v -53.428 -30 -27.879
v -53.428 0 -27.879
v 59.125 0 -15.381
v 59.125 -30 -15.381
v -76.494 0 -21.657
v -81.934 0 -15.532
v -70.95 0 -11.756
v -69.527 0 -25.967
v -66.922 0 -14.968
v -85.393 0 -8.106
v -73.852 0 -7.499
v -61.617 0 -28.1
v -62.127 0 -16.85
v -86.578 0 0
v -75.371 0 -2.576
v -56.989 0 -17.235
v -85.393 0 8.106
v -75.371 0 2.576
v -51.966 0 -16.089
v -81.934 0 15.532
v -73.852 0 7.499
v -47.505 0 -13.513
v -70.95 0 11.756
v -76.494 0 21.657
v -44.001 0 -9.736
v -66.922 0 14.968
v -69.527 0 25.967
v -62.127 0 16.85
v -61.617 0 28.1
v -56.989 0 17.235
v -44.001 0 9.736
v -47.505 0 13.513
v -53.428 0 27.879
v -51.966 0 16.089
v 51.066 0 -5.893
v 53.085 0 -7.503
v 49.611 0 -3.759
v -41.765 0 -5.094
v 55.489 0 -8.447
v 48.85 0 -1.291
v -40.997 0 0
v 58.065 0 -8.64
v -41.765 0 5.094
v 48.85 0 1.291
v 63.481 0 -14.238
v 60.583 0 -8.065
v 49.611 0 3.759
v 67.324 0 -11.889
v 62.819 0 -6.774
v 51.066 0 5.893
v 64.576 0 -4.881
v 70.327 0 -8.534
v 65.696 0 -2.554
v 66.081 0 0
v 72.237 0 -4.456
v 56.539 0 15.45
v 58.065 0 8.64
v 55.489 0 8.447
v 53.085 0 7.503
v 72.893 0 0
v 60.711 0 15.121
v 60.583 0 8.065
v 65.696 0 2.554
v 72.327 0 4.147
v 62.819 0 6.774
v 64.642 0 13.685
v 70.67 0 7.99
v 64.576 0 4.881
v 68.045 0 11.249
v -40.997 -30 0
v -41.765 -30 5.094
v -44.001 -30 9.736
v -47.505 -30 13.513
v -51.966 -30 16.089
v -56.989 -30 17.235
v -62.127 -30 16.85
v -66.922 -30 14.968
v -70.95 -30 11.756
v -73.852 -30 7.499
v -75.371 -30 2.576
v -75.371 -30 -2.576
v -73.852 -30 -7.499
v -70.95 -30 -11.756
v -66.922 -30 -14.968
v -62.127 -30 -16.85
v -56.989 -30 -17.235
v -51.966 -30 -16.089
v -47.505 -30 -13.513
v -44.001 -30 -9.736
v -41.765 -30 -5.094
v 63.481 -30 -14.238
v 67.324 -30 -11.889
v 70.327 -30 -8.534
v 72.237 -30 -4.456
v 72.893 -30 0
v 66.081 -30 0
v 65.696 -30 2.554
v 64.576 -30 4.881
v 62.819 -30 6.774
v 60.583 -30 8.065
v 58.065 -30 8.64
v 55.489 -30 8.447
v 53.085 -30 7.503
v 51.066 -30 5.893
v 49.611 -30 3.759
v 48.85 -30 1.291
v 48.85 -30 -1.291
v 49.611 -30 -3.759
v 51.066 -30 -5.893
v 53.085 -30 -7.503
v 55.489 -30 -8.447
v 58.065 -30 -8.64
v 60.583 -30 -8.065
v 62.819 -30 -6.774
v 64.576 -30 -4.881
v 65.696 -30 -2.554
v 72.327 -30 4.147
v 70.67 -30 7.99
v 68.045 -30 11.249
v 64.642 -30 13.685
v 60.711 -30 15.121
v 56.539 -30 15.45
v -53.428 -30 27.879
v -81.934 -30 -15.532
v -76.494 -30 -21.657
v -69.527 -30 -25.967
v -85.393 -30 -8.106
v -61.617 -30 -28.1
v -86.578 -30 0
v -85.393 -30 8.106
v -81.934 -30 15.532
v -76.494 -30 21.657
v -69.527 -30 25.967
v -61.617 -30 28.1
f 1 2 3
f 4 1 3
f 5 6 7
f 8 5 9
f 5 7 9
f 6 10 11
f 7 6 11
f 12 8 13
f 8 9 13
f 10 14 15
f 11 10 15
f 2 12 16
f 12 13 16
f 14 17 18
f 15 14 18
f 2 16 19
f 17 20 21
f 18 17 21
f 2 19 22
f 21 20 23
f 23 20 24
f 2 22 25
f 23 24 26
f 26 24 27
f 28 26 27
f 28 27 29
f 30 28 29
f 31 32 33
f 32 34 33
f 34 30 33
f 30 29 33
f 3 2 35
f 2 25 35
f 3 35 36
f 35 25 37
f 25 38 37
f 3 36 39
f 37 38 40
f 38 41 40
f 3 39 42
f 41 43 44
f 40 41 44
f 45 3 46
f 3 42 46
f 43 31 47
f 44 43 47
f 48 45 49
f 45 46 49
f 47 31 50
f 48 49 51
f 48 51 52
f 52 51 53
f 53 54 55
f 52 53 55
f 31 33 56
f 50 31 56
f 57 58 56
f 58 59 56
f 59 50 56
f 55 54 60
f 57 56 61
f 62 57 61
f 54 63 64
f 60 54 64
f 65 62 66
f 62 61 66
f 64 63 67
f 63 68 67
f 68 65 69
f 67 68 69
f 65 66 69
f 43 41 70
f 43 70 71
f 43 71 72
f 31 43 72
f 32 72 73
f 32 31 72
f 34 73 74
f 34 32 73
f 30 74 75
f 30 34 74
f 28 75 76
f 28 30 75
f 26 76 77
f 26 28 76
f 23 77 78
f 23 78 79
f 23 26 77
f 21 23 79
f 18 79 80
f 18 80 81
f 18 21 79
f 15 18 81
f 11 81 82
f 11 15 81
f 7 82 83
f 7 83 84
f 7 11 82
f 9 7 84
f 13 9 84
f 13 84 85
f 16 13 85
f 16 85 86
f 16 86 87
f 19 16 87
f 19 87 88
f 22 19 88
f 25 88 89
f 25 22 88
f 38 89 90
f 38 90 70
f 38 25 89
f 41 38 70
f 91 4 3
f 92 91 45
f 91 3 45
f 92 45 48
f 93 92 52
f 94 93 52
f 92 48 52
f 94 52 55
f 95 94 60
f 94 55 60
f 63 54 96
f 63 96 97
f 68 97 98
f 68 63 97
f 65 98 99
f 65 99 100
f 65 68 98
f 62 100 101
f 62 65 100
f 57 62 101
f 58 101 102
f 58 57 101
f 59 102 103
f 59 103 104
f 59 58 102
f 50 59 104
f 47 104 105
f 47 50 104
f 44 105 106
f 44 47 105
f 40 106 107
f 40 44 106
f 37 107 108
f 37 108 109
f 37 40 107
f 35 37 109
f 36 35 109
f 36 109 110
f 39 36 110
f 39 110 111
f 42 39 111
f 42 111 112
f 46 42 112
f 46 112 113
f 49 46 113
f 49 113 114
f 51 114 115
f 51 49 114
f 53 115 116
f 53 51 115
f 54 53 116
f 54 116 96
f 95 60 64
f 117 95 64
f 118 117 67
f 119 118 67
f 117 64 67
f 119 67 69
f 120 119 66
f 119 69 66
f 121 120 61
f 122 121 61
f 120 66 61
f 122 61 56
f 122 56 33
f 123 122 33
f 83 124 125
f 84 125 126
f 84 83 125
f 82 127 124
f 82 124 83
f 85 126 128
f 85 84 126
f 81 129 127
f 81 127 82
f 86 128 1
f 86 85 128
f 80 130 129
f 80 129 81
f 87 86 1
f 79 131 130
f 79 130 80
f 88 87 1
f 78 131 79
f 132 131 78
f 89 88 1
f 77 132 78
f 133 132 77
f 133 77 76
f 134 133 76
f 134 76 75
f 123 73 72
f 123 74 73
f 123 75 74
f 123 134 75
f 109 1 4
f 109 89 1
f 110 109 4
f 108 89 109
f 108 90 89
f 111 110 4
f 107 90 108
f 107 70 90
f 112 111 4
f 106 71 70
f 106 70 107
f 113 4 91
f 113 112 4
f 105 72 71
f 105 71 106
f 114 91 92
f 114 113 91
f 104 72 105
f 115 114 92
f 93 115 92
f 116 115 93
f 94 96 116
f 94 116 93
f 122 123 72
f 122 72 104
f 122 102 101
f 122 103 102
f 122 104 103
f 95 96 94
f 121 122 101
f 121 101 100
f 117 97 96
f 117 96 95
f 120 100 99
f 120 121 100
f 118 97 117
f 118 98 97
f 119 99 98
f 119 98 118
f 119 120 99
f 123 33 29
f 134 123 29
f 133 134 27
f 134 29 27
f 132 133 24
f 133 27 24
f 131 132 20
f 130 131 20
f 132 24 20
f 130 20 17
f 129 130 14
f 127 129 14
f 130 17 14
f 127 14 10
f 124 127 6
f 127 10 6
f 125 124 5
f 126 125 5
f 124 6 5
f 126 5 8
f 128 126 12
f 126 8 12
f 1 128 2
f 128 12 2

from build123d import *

# Parameters (mm, degrees)
F0_R     = 17.283329
F0_R_2   = 8.664102
F1_DEPTH = 30


with BuildPart() as f1:
    # F0 (on Front) → F1 (new body)
    with BuildSketch(Plane.XZ):
        with BuildLine():
            ThreePointArc((-53.428299, -27.878553), (-36.62345, -18.213297), (-29.982977, 0))
            ThreePointArc((-29.982977, 0), (-36.62345, 18.213297), (-53.428299, 27.878553))
            ThreePointArc((-53.428299, 27.878553), (-86.578354, 0), (-53.428299, -27.878553))
        make_face()
        with Locations((-58.280665, 0)):
            Circle(F0_R, mode=Mode.SUBTRACT)
        with BuildLine():
            ThreePointArc((-53.428299, 27.878553), (-36.62345, 18.213297), (-29.982977, 0))
            ThreePointArc((-29.982977, 0), (-36.62345, -18.213297), (-53.428299, -27.878553))
            Line((-53.428299, -27.878553), (59.125109, -15.380887))
            ThreePointArc((59.125109, -15.380887), (41.996, -1.293634), (56.538776, 15.450461))
            Line((56.538776, 15.450461), (-53.428299, 27.878553))
        make_face()
        with BuildLine():
            ThreePointArc((72.892666, 0), (68.044897, 11.249072), (56.538776, 15.450461))
            ThreePointArc((56.538776, 15.450461), (41.996, -1.293634), (59.125109, -15.380887))
            ThreePointArc((59.125109, -15.380887), (68.948042, -10.321305), (72.892666, 0))
        make_face()
        with Locations((57.417251, 0)):
            Circle(F0_R_2, mode=Mode.SUBTRACT)
    extrude(amount=F1_DEPTH)


solid = f1.part
